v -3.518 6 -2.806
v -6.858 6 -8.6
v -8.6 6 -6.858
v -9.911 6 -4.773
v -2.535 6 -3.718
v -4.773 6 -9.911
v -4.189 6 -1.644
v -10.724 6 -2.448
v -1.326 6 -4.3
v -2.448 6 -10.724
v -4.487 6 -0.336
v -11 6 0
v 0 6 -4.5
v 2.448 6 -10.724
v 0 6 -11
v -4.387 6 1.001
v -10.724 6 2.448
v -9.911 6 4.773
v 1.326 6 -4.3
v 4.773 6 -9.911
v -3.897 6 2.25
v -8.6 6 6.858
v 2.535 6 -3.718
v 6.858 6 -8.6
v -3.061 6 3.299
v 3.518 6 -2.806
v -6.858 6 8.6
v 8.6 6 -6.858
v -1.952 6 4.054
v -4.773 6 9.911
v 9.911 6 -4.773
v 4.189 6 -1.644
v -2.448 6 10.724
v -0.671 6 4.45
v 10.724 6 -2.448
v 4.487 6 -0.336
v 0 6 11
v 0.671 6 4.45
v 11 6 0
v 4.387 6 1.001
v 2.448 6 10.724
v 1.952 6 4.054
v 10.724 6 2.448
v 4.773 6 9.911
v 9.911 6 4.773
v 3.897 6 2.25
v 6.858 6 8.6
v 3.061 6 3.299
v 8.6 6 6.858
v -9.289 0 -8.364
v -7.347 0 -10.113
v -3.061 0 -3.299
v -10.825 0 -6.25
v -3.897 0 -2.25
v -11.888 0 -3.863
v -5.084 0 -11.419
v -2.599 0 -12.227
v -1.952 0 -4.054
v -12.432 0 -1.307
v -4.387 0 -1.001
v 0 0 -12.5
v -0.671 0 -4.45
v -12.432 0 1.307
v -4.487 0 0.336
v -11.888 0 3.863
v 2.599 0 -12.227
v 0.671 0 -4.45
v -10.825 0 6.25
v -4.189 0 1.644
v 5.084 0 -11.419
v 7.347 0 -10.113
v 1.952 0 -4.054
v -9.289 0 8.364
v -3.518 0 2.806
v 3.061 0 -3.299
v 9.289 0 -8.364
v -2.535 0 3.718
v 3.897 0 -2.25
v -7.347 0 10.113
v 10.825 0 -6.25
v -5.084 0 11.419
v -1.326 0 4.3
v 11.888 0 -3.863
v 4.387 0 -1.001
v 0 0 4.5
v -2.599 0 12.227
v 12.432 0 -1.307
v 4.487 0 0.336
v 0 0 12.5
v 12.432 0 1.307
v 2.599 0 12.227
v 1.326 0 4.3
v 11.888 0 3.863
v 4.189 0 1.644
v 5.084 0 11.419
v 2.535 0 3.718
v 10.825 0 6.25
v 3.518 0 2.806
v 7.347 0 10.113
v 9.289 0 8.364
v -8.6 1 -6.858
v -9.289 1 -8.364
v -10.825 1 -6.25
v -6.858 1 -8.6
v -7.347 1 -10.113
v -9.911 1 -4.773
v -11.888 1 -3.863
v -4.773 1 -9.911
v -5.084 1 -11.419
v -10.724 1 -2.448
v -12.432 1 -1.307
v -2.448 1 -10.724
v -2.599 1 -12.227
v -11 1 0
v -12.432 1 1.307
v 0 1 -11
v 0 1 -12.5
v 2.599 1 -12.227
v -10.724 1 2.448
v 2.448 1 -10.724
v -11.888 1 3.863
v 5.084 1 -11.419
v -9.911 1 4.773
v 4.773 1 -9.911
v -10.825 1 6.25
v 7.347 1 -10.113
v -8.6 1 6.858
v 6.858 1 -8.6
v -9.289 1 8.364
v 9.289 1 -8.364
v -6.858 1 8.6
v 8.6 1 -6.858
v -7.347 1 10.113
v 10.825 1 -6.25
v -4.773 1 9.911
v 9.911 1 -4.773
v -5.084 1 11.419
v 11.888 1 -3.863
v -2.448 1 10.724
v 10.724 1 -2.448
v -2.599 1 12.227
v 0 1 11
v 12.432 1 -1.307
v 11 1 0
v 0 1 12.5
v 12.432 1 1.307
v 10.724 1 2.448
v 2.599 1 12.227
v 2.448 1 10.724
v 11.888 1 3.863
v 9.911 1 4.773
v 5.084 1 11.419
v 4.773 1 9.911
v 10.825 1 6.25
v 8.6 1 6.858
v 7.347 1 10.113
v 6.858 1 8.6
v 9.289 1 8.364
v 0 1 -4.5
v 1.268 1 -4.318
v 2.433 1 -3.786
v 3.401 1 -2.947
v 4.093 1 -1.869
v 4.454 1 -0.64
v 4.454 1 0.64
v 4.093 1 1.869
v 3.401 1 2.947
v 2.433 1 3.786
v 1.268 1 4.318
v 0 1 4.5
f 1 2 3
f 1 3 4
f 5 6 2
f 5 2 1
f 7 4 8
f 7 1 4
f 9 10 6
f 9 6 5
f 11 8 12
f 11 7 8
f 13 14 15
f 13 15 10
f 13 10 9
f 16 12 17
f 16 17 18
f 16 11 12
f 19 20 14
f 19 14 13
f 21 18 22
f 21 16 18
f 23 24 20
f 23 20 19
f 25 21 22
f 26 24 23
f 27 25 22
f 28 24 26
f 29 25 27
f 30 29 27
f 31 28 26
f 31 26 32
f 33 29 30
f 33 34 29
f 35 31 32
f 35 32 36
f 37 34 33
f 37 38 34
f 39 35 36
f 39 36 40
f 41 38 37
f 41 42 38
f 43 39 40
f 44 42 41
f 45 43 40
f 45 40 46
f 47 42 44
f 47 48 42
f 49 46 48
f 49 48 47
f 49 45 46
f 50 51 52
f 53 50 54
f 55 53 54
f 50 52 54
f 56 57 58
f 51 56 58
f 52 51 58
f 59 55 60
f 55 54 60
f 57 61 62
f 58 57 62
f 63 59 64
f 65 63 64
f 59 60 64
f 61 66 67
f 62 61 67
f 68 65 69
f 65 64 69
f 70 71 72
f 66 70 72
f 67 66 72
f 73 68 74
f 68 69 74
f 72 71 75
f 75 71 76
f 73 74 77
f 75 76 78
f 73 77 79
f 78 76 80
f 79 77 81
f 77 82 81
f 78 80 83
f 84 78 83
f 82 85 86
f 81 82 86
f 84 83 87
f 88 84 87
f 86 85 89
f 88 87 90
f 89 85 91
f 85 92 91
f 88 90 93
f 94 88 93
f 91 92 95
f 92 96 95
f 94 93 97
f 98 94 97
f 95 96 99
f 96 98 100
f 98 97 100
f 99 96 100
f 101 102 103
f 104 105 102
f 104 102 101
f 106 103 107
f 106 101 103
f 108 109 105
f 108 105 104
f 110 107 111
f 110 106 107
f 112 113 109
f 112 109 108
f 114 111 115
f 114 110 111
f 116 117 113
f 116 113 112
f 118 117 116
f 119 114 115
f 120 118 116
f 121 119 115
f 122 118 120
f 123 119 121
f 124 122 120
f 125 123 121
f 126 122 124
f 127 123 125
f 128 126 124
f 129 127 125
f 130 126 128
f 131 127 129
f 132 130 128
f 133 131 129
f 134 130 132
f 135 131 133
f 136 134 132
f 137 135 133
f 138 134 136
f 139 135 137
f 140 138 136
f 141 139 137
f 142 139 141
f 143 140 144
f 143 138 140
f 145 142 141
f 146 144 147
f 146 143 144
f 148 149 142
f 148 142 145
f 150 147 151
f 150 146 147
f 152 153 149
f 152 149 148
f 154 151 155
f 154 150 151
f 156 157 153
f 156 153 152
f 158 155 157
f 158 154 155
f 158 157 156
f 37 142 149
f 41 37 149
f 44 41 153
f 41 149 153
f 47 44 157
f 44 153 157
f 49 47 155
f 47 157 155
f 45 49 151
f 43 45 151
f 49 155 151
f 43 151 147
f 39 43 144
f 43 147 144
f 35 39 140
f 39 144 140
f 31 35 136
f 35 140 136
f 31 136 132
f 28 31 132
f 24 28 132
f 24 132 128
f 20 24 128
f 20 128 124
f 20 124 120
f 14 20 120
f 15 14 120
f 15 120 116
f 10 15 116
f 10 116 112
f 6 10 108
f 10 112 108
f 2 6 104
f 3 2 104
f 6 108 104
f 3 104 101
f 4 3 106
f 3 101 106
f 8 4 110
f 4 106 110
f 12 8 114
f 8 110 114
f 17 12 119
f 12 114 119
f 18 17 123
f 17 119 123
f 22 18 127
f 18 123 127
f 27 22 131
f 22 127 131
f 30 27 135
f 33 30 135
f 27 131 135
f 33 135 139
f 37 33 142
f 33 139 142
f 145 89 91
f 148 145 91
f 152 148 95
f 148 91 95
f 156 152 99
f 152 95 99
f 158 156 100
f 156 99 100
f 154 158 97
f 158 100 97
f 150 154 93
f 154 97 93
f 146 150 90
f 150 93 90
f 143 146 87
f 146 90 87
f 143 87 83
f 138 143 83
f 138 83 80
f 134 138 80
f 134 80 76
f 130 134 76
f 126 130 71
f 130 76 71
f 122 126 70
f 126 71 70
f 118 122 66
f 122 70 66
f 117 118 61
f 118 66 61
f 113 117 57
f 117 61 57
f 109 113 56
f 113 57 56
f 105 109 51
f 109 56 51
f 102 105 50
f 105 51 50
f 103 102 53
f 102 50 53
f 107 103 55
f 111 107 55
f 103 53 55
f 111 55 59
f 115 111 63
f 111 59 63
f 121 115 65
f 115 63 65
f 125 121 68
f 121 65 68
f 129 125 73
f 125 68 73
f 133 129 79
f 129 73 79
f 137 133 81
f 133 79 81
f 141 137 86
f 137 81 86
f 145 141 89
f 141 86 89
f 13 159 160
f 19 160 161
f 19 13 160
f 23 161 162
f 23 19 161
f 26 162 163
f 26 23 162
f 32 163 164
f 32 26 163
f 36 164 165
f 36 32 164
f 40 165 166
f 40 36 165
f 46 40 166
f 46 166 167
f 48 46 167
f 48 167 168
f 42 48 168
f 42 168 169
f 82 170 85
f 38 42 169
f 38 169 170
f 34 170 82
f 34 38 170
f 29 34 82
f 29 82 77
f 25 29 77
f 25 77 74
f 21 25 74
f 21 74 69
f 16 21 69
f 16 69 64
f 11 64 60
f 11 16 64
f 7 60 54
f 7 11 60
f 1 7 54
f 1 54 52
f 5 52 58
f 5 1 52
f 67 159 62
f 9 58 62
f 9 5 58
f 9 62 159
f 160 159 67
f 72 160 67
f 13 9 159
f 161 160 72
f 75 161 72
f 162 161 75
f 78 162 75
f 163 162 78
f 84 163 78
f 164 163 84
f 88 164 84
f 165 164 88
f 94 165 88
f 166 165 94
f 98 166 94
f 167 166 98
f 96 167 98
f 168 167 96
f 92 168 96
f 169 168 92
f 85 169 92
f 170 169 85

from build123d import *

# Parameters (mm, degrees)
SKETCH1_R               = 12.5
SKETCH1_R_2             = 4.5
BOSS_EXTRUDE1_DEPTH     = 1
SKETCH2_R               = 11
BOSS_EXTRUDE2_DEPTH     = 5
CUT_EXTRUDE1_DEPTH      = 19.371173071
CUT_EXTRUDE1_DEPTH_BACK = 19.371173071
SKETCH3_R               = 4.5


with BuildPart() as part:
    # Sketch1 → Boss-Extrude1 (new body)
    with BuildSketch(Plane(origin=(0, 0, 0), x_dir=(1, 0, 0), z_dir=(0, 1, 0))):
        with Locations(Location((0, 0, 0), (0, 0, 270))):
            Circle(SKETCH1_R)
        with Locations(Location((0, 0, 0), (0, 0, 270))):
            Circle(SKETCH1_R_2, mode=Mode.SUBTRACT)
    extrude(amount=BOSS_EXTRUDE1_DEPTH)

    # Sketch2 → Boss-Extrude2 (add)
    with BuildSketch(Plane(origin=(0, 1, 0), x_dir=(1, 0, 0), z_dir=(0, 1, 0))):
        with Locations(Location((0, 0, 0), (0, 0, 270))):
            Circle(SKETCH2_R)
    extrude(amount=BOSS_EXTRUDE2_DEPTH)

    # Sketch3 → Cut-Extrude1 (cut, two sides: drawn at the far end of the back side and taken through both)
    with BuildSketch(Plane.XZ.offset(-1).offset(-CUT_EXTRUDE1_DEPTH_BACK)):
        with Locations(Location((0, 0, 0), (0, 0, 270))):
            Circle(SKETCH3_R)
    extrude(amount=CUT_EXTRUDE1_DEPTH + CUT_EXTRUDE1_DEPTH_BACK, mode=Mode.SUBTRACT)


solid = part.part
